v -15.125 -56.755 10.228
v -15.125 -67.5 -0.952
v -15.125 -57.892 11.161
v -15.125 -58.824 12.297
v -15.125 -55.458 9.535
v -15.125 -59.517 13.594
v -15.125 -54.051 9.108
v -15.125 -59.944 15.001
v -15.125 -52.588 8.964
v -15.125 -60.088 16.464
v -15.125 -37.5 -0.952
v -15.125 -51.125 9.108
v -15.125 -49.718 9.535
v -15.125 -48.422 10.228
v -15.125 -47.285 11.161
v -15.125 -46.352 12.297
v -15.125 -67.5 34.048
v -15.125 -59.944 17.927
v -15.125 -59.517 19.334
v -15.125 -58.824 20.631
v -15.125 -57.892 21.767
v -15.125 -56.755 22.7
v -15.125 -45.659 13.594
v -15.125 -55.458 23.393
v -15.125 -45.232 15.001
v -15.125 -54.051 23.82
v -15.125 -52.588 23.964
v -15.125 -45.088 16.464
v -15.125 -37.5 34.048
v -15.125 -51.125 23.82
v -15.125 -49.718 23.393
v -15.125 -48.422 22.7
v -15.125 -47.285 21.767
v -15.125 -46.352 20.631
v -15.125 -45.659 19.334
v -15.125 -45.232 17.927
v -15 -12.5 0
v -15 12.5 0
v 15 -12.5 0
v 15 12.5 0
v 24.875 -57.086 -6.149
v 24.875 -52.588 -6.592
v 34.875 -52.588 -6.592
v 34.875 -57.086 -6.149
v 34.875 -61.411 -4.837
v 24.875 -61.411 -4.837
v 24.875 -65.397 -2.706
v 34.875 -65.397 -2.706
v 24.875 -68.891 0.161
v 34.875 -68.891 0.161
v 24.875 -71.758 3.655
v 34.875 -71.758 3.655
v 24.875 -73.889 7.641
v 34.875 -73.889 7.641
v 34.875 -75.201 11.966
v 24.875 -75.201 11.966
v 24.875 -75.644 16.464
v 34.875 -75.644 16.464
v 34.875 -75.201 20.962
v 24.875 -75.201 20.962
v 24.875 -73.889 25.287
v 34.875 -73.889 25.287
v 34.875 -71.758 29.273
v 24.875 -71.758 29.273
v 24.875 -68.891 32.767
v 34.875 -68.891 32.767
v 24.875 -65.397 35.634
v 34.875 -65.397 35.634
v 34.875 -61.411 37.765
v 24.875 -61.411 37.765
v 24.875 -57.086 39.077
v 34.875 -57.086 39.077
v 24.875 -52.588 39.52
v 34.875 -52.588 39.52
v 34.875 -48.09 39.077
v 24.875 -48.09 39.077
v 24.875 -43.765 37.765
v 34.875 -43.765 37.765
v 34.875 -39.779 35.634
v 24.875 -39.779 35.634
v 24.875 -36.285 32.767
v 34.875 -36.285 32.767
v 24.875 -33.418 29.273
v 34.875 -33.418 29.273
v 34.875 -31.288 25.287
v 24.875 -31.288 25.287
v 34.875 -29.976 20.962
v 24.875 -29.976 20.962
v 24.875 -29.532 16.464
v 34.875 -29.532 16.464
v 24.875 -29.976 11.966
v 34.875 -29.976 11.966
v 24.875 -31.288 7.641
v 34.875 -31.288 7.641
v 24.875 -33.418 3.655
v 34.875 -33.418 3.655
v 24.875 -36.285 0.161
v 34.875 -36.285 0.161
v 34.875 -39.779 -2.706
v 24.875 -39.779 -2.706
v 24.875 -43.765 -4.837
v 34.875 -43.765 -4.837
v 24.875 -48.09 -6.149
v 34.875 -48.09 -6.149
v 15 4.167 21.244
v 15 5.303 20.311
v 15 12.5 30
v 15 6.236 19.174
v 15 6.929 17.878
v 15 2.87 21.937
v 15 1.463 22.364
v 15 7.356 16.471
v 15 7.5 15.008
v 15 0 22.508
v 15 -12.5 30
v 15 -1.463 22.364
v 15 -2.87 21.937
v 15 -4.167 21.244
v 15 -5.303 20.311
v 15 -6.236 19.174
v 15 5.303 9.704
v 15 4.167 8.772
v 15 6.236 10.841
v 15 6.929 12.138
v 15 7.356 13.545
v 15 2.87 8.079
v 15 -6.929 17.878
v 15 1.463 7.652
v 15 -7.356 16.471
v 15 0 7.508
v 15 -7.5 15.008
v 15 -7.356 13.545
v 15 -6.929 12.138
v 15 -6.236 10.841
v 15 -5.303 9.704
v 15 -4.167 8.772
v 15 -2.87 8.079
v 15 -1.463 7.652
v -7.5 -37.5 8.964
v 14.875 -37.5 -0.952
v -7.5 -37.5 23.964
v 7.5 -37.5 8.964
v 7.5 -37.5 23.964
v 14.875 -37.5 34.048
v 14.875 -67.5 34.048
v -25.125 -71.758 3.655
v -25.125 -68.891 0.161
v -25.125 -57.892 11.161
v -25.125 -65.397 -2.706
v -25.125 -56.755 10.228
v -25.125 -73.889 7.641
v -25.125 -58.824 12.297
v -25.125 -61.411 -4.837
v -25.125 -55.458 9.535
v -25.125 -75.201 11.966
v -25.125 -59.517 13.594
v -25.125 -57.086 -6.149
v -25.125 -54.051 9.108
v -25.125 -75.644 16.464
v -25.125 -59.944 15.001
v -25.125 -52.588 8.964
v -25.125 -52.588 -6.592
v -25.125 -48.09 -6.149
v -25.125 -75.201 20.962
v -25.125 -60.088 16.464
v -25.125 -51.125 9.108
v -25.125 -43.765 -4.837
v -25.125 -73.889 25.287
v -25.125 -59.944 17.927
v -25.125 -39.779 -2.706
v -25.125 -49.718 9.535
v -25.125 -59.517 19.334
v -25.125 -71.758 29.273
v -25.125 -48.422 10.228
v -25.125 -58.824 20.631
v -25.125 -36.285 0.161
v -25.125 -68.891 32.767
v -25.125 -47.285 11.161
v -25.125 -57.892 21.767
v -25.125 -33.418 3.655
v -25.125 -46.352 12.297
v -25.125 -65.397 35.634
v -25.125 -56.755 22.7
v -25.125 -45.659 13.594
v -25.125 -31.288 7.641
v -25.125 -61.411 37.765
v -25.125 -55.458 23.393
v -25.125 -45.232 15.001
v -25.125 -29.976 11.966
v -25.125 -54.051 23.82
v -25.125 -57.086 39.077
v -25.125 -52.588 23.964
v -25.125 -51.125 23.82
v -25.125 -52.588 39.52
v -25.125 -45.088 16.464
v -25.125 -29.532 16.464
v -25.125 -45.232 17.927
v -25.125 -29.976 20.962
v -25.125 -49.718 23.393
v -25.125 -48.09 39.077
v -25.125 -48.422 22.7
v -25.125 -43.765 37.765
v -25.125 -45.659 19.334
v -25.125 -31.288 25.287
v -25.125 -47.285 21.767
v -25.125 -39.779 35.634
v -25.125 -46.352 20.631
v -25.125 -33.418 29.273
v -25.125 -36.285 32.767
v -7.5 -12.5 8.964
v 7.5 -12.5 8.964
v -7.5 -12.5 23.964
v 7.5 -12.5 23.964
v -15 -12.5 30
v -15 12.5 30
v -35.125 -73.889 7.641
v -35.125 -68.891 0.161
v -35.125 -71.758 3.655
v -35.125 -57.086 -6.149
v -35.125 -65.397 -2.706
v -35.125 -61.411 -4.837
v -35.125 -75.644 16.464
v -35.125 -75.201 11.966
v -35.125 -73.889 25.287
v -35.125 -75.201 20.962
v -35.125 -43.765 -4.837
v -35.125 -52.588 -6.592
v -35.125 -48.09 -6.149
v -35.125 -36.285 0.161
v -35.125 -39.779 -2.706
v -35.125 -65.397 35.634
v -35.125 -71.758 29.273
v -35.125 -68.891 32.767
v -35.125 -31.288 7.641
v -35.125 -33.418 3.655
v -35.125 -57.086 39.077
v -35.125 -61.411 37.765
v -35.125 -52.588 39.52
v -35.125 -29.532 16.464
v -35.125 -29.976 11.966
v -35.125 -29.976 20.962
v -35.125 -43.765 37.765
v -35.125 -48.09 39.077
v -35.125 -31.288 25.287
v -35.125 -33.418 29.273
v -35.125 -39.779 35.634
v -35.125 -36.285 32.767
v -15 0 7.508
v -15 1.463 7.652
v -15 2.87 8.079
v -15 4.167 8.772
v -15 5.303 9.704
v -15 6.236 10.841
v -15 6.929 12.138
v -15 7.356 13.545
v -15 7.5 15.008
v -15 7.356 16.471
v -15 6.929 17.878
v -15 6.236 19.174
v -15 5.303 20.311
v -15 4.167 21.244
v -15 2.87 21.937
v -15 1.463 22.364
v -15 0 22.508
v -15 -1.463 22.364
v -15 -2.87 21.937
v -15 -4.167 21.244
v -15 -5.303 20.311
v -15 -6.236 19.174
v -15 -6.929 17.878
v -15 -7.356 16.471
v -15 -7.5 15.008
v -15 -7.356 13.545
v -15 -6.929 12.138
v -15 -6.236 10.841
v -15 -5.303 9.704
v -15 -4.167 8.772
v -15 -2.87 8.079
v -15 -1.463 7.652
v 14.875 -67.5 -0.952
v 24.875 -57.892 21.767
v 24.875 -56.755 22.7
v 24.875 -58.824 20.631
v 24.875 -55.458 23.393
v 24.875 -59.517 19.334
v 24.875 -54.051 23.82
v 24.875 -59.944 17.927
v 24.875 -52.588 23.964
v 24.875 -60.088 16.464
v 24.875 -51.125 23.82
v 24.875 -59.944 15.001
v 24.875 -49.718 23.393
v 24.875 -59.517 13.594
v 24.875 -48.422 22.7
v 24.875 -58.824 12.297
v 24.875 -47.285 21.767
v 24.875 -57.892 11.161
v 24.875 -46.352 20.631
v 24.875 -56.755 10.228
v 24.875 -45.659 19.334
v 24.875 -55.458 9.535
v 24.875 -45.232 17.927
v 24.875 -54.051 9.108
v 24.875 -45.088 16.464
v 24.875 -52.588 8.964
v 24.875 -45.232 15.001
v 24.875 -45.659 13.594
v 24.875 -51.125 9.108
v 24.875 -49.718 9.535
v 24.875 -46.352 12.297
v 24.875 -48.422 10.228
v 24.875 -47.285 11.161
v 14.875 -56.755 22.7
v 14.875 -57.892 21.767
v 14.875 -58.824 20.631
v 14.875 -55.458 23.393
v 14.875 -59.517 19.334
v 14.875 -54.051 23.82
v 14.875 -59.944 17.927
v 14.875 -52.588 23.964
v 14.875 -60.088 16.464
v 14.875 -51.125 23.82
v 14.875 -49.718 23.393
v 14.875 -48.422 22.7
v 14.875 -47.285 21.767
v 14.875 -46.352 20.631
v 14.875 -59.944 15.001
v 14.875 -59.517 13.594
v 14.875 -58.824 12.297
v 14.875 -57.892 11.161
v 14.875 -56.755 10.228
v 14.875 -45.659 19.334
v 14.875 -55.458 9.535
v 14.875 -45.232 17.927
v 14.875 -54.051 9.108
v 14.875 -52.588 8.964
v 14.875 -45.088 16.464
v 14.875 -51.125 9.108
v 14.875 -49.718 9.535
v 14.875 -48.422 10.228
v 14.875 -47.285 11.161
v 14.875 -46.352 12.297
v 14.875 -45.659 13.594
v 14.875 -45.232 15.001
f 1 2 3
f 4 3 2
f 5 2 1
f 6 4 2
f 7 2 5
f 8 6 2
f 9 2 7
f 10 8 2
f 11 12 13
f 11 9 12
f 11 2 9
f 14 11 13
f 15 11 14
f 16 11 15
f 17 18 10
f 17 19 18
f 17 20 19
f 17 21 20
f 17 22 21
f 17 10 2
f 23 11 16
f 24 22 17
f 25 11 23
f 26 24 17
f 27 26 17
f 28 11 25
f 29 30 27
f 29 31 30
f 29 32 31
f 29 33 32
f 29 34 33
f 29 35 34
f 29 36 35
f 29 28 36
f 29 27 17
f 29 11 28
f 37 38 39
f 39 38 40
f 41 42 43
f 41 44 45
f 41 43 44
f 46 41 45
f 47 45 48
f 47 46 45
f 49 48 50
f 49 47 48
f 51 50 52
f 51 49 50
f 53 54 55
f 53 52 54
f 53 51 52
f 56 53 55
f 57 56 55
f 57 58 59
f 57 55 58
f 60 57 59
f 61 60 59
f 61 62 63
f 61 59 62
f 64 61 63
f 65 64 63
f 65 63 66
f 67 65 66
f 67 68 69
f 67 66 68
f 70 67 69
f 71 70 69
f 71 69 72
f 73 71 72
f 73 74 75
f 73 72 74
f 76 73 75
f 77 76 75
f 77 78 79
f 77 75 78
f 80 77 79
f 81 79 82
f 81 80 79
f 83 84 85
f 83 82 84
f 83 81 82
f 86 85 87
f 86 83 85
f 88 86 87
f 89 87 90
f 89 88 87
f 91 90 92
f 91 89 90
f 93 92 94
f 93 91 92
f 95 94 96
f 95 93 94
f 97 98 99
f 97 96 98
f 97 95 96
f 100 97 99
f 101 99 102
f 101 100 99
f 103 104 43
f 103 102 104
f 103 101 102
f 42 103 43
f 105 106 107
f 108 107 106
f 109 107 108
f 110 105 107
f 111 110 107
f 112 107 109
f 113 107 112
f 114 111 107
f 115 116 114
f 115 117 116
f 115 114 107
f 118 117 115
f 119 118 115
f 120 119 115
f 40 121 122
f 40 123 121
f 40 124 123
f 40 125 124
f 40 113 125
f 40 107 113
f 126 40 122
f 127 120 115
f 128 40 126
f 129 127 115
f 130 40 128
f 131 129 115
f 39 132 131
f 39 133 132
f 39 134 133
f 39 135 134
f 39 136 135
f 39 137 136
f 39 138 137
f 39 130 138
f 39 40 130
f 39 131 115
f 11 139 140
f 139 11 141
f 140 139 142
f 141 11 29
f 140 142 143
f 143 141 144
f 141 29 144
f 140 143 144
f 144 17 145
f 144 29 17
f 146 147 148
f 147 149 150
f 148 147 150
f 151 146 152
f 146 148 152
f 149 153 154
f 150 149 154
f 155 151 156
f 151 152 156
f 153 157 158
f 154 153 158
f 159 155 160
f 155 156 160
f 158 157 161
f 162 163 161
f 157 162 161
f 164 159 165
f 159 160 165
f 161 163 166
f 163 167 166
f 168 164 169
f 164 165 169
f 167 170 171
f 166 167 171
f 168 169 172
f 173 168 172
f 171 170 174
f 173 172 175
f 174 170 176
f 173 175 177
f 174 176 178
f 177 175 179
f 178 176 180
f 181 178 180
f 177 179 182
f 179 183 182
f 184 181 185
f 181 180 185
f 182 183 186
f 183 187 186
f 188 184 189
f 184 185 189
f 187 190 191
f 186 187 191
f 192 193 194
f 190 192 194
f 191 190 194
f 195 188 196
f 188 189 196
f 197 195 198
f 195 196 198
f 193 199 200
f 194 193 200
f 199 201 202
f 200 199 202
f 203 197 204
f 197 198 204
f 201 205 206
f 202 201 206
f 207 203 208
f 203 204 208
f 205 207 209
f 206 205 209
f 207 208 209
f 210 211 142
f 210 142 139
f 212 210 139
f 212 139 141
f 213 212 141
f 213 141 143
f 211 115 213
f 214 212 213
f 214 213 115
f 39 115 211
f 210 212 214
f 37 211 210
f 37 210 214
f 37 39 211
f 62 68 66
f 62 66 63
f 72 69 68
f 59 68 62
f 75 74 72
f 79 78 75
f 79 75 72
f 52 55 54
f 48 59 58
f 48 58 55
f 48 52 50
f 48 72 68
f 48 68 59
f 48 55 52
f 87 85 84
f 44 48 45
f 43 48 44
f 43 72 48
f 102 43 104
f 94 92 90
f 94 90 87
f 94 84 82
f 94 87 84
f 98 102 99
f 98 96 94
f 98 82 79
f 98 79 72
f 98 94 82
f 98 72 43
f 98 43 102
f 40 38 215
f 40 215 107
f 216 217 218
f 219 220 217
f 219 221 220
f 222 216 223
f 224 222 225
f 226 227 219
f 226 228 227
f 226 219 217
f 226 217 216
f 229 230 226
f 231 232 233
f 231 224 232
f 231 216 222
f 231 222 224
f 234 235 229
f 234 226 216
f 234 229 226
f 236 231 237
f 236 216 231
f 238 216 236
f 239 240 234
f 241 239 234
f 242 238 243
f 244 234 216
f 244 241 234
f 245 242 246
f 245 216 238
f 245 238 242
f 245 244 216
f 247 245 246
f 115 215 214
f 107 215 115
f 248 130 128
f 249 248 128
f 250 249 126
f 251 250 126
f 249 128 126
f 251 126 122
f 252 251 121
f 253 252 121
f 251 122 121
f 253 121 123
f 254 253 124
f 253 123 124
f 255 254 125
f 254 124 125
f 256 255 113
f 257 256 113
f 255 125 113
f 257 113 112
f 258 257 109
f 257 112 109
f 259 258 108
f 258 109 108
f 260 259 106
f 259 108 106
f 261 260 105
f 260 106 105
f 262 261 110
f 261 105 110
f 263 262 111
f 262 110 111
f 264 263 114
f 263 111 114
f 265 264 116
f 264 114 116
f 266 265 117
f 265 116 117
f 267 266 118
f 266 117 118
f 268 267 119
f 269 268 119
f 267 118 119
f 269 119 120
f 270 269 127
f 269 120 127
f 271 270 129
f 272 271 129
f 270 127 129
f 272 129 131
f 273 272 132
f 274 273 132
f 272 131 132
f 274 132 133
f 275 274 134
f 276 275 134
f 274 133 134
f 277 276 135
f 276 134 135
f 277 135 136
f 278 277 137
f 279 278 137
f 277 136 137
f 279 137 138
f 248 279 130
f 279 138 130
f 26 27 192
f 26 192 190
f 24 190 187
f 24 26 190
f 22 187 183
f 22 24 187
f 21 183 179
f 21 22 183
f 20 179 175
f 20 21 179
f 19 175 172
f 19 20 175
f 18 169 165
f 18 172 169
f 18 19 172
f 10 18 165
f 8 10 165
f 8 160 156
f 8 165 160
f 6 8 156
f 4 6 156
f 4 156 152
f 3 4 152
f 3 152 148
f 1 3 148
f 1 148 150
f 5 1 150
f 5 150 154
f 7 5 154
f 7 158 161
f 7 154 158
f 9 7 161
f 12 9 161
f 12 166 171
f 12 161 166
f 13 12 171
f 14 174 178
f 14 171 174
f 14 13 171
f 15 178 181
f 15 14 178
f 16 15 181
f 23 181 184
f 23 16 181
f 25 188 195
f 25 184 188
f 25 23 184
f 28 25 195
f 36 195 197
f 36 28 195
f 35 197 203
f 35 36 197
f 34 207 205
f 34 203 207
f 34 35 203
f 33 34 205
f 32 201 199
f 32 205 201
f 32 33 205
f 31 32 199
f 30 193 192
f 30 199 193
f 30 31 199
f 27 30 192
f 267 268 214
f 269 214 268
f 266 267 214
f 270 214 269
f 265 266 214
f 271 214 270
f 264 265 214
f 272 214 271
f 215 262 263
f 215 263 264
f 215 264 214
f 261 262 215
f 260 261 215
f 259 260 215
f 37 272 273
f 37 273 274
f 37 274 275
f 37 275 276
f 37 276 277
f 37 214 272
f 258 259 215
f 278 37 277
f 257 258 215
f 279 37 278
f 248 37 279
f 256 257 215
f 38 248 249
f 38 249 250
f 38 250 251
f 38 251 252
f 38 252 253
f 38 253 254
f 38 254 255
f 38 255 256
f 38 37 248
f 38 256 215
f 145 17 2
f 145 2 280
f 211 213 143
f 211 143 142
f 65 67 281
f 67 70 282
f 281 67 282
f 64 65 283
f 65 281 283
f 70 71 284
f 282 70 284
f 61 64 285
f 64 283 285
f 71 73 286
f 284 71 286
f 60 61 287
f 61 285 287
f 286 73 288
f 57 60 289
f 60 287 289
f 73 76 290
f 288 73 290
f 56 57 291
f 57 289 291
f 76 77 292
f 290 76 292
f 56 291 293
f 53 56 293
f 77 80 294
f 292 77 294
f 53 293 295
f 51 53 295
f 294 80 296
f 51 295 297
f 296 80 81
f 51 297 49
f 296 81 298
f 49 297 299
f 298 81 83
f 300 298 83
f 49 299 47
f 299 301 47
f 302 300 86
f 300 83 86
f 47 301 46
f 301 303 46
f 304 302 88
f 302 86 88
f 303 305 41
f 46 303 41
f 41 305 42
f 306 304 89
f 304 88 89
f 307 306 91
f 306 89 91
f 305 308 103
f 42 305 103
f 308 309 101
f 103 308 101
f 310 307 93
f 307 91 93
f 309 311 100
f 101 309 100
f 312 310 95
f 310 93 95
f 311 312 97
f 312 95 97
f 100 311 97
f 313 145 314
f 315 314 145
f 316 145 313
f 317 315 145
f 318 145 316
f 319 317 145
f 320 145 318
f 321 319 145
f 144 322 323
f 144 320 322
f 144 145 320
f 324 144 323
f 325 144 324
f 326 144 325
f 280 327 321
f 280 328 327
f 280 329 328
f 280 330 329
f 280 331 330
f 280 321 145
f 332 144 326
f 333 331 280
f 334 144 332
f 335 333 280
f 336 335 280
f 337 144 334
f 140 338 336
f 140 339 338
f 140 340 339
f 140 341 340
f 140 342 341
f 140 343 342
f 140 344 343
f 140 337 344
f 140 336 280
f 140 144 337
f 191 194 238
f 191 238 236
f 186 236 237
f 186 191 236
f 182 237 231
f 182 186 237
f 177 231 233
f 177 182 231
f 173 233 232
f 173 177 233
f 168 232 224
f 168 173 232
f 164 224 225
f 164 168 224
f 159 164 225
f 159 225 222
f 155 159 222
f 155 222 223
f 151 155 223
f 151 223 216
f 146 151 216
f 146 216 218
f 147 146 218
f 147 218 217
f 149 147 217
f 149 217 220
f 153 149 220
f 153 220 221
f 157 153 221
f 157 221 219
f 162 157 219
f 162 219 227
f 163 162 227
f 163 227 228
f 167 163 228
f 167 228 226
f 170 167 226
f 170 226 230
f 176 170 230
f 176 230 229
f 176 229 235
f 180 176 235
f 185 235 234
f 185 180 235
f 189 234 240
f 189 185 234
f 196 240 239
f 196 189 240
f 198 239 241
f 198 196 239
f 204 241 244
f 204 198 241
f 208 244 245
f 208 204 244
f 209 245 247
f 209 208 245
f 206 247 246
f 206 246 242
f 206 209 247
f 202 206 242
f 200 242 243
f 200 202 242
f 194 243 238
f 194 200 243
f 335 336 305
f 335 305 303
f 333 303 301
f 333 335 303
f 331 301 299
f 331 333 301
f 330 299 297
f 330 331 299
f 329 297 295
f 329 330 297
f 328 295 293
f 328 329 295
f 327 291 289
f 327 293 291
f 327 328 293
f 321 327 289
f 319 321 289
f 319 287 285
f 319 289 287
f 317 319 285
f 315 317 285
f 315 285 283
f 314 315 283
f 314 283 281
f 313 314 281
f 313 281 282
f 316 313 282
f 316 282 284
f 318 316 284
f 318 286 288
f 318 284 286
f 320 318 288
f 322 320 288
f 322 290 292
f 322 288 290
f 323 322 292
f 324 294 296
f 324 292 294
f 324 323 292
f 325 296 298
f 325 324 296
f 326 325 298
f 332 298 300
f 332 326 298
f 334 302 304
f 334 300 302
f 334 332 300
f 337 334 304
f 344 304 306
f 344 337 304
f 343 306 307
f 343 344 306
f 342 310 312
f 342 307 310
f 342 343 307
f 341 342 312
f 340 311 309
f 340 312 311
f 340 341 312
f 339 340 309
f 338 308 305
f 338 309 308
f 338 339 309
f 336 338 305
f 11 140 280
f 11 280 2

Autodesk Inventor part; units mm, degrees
ref_plane "YZ Plane" through (0, 0, 0) normal (1, 0, 0) x (0, 1, 0)
ref_plane "XZ Plane" through (0, 0, 0) normal (0, 1, 0) x (-1, 0, 0)
ref_plane "XY Plane" through (0, 0, 0) normal (0, 0, 1) x (1, 0, 0)
sketch "Sketch1" plane through (0, 0, 0) normal (0, 0, 1) x (1, 0, 0)
  line L0 (-15, 12.5) -> (15, 12.5)
  line L1 (15, 12.5) -> (15, -12.5)
  line L2 (15, -12.5) -> (-15, -12.5)
  line L3 (-15, -12.5) -> (-15, 12.5)
  line L4 (-15, 12.5) -> (15, -12.5) construction
  line L5 (15, 12.5) -> (-15, -12.5) construction
  point P0 (0, 0)
  dimension "d0" = 30
  dimension "d1" = 25
extrude "Extrusion1" add sketch "Sketch1" along normal blind 30
sketch "Sketch2" plane through (15, -12.5, 0) normal (1, 0, 0) x (0, 0, -1)
  circle A0 centre (-15.0077, 12.5) radius 7.5
  point P0 (0, 12.5)
  dimension "d4" = 15
extrude "Extrusion2" cut sketch "Sketch2" against normal through all
sketch "Sketch3" plane through (-15, -12.5, 0) normal (0, -1, 0) x (1, 0, 0)
  line L0 (7.5, 23.9638) -> (22.5, 23.9638)
  line L1 (22.5, 23.9638) -> (22.5, 8.9638)
  line L2 (22.5, 8.9638) -> (7.5, 8.9638)
  line L3 (7.5, 8.9638) -> (7.5, 23.9638)
  line L4 (7.5, 23.9638) -> (22.5, 8.9638) construction
  line L5 (22.5, 23.9638) -> (7.5, 8.9638) construction
  point P0 (15, 0)
  point P1 (15, 16.4638)
  dimension "d7" = 15
  dimension "d8" = 15
extrude "Extrusion3" add sketch "Sketch3" along normal blind 25
sketch "Sketch4" plane through (-15, -37.5, 0) normal (0, -1, 0) x (1, 0, 0)
  line L0 (-0.1247, 34.0483) -> (29.8753, 34.0483)
  line L1 (29.8753, 34.0483) -> (29.8753, -0.9517)
  line L2 (29.8753, -0.9517) -> (-0.1247, -0.9517)
  line L3 (-0.1247, -0.9517) -> (-0.1247, 34.0483)
  line L4 (-0.1247, 34.0483) -> (29.8753, -0.9517) construction
  line L5 (29.8753, 34.0483) -> (-0.1247, -0.9517) construction
  point P0 (15, 0)
  point P1 (14.8753, 16.5483)
  dimension "d11" = 30
  dimension "d12" = 35
extrude "Extrusion4" add sketch "Sketch4" along normal blind 30
sketch "Sketch5" plane through (-15.1247, -37.5, -0.9517) normal (-1, 0, 0) x (0, 0, 1)
  circle A0 centre (17.4156, -15.0883) radius 7.5
  point P0 (0.9517, 37.5)
  dimension "d15" = 15
extrude "Extrusion5" add sketch "Sketch5" along normal blind 10
sketch "Sketch6" plane through (14.8753, -37.5, 34.0483) normal (1, 0, 0) x (0, 0, -1)
  circle A0 centre (17.5844, -15.0883) radius 7.5 projected
  circle A1 centre (17.5844, -15.0883) radius 7.5
  point P0 (34.0483, 37.5)
extrude "Extrusion6" add sketch "Sketch6" along normal blind 10
sketch "Sketch7" plane through (-25.1247, -52.5883, 16.4638) normal (-1, 0, 0) x (0, 0, 1)
  line L0 (-17.4156, -14.9117) -> (17.5844, -14.9117) projected
  circle A0 centre (0, 0) radius 23.0558
  point P0 (-16.4638, 52.5883)
extrude "Extrusion7" add sketch "Sketch7" along normal blind 10
sketch "Sketch8" plane through (24.8753, -52.5883, 16.4638) normal (1, 0, 0) x (0, 0, -1)
  circle A0 centre (0, 0) radius 7.5 projected
  circle A1 centre (0, 0) radius 23.0558 projected
  circle A2 centre (0, 0) radius 23.056
  point P0 (16.4638, 52.5883)
  dimension "d22" = 46.112
extrude "Extrusion8" add sketch "Sketch8" along normal blind 10 contours A0 | A1
properties part number "Part4_remodified"
